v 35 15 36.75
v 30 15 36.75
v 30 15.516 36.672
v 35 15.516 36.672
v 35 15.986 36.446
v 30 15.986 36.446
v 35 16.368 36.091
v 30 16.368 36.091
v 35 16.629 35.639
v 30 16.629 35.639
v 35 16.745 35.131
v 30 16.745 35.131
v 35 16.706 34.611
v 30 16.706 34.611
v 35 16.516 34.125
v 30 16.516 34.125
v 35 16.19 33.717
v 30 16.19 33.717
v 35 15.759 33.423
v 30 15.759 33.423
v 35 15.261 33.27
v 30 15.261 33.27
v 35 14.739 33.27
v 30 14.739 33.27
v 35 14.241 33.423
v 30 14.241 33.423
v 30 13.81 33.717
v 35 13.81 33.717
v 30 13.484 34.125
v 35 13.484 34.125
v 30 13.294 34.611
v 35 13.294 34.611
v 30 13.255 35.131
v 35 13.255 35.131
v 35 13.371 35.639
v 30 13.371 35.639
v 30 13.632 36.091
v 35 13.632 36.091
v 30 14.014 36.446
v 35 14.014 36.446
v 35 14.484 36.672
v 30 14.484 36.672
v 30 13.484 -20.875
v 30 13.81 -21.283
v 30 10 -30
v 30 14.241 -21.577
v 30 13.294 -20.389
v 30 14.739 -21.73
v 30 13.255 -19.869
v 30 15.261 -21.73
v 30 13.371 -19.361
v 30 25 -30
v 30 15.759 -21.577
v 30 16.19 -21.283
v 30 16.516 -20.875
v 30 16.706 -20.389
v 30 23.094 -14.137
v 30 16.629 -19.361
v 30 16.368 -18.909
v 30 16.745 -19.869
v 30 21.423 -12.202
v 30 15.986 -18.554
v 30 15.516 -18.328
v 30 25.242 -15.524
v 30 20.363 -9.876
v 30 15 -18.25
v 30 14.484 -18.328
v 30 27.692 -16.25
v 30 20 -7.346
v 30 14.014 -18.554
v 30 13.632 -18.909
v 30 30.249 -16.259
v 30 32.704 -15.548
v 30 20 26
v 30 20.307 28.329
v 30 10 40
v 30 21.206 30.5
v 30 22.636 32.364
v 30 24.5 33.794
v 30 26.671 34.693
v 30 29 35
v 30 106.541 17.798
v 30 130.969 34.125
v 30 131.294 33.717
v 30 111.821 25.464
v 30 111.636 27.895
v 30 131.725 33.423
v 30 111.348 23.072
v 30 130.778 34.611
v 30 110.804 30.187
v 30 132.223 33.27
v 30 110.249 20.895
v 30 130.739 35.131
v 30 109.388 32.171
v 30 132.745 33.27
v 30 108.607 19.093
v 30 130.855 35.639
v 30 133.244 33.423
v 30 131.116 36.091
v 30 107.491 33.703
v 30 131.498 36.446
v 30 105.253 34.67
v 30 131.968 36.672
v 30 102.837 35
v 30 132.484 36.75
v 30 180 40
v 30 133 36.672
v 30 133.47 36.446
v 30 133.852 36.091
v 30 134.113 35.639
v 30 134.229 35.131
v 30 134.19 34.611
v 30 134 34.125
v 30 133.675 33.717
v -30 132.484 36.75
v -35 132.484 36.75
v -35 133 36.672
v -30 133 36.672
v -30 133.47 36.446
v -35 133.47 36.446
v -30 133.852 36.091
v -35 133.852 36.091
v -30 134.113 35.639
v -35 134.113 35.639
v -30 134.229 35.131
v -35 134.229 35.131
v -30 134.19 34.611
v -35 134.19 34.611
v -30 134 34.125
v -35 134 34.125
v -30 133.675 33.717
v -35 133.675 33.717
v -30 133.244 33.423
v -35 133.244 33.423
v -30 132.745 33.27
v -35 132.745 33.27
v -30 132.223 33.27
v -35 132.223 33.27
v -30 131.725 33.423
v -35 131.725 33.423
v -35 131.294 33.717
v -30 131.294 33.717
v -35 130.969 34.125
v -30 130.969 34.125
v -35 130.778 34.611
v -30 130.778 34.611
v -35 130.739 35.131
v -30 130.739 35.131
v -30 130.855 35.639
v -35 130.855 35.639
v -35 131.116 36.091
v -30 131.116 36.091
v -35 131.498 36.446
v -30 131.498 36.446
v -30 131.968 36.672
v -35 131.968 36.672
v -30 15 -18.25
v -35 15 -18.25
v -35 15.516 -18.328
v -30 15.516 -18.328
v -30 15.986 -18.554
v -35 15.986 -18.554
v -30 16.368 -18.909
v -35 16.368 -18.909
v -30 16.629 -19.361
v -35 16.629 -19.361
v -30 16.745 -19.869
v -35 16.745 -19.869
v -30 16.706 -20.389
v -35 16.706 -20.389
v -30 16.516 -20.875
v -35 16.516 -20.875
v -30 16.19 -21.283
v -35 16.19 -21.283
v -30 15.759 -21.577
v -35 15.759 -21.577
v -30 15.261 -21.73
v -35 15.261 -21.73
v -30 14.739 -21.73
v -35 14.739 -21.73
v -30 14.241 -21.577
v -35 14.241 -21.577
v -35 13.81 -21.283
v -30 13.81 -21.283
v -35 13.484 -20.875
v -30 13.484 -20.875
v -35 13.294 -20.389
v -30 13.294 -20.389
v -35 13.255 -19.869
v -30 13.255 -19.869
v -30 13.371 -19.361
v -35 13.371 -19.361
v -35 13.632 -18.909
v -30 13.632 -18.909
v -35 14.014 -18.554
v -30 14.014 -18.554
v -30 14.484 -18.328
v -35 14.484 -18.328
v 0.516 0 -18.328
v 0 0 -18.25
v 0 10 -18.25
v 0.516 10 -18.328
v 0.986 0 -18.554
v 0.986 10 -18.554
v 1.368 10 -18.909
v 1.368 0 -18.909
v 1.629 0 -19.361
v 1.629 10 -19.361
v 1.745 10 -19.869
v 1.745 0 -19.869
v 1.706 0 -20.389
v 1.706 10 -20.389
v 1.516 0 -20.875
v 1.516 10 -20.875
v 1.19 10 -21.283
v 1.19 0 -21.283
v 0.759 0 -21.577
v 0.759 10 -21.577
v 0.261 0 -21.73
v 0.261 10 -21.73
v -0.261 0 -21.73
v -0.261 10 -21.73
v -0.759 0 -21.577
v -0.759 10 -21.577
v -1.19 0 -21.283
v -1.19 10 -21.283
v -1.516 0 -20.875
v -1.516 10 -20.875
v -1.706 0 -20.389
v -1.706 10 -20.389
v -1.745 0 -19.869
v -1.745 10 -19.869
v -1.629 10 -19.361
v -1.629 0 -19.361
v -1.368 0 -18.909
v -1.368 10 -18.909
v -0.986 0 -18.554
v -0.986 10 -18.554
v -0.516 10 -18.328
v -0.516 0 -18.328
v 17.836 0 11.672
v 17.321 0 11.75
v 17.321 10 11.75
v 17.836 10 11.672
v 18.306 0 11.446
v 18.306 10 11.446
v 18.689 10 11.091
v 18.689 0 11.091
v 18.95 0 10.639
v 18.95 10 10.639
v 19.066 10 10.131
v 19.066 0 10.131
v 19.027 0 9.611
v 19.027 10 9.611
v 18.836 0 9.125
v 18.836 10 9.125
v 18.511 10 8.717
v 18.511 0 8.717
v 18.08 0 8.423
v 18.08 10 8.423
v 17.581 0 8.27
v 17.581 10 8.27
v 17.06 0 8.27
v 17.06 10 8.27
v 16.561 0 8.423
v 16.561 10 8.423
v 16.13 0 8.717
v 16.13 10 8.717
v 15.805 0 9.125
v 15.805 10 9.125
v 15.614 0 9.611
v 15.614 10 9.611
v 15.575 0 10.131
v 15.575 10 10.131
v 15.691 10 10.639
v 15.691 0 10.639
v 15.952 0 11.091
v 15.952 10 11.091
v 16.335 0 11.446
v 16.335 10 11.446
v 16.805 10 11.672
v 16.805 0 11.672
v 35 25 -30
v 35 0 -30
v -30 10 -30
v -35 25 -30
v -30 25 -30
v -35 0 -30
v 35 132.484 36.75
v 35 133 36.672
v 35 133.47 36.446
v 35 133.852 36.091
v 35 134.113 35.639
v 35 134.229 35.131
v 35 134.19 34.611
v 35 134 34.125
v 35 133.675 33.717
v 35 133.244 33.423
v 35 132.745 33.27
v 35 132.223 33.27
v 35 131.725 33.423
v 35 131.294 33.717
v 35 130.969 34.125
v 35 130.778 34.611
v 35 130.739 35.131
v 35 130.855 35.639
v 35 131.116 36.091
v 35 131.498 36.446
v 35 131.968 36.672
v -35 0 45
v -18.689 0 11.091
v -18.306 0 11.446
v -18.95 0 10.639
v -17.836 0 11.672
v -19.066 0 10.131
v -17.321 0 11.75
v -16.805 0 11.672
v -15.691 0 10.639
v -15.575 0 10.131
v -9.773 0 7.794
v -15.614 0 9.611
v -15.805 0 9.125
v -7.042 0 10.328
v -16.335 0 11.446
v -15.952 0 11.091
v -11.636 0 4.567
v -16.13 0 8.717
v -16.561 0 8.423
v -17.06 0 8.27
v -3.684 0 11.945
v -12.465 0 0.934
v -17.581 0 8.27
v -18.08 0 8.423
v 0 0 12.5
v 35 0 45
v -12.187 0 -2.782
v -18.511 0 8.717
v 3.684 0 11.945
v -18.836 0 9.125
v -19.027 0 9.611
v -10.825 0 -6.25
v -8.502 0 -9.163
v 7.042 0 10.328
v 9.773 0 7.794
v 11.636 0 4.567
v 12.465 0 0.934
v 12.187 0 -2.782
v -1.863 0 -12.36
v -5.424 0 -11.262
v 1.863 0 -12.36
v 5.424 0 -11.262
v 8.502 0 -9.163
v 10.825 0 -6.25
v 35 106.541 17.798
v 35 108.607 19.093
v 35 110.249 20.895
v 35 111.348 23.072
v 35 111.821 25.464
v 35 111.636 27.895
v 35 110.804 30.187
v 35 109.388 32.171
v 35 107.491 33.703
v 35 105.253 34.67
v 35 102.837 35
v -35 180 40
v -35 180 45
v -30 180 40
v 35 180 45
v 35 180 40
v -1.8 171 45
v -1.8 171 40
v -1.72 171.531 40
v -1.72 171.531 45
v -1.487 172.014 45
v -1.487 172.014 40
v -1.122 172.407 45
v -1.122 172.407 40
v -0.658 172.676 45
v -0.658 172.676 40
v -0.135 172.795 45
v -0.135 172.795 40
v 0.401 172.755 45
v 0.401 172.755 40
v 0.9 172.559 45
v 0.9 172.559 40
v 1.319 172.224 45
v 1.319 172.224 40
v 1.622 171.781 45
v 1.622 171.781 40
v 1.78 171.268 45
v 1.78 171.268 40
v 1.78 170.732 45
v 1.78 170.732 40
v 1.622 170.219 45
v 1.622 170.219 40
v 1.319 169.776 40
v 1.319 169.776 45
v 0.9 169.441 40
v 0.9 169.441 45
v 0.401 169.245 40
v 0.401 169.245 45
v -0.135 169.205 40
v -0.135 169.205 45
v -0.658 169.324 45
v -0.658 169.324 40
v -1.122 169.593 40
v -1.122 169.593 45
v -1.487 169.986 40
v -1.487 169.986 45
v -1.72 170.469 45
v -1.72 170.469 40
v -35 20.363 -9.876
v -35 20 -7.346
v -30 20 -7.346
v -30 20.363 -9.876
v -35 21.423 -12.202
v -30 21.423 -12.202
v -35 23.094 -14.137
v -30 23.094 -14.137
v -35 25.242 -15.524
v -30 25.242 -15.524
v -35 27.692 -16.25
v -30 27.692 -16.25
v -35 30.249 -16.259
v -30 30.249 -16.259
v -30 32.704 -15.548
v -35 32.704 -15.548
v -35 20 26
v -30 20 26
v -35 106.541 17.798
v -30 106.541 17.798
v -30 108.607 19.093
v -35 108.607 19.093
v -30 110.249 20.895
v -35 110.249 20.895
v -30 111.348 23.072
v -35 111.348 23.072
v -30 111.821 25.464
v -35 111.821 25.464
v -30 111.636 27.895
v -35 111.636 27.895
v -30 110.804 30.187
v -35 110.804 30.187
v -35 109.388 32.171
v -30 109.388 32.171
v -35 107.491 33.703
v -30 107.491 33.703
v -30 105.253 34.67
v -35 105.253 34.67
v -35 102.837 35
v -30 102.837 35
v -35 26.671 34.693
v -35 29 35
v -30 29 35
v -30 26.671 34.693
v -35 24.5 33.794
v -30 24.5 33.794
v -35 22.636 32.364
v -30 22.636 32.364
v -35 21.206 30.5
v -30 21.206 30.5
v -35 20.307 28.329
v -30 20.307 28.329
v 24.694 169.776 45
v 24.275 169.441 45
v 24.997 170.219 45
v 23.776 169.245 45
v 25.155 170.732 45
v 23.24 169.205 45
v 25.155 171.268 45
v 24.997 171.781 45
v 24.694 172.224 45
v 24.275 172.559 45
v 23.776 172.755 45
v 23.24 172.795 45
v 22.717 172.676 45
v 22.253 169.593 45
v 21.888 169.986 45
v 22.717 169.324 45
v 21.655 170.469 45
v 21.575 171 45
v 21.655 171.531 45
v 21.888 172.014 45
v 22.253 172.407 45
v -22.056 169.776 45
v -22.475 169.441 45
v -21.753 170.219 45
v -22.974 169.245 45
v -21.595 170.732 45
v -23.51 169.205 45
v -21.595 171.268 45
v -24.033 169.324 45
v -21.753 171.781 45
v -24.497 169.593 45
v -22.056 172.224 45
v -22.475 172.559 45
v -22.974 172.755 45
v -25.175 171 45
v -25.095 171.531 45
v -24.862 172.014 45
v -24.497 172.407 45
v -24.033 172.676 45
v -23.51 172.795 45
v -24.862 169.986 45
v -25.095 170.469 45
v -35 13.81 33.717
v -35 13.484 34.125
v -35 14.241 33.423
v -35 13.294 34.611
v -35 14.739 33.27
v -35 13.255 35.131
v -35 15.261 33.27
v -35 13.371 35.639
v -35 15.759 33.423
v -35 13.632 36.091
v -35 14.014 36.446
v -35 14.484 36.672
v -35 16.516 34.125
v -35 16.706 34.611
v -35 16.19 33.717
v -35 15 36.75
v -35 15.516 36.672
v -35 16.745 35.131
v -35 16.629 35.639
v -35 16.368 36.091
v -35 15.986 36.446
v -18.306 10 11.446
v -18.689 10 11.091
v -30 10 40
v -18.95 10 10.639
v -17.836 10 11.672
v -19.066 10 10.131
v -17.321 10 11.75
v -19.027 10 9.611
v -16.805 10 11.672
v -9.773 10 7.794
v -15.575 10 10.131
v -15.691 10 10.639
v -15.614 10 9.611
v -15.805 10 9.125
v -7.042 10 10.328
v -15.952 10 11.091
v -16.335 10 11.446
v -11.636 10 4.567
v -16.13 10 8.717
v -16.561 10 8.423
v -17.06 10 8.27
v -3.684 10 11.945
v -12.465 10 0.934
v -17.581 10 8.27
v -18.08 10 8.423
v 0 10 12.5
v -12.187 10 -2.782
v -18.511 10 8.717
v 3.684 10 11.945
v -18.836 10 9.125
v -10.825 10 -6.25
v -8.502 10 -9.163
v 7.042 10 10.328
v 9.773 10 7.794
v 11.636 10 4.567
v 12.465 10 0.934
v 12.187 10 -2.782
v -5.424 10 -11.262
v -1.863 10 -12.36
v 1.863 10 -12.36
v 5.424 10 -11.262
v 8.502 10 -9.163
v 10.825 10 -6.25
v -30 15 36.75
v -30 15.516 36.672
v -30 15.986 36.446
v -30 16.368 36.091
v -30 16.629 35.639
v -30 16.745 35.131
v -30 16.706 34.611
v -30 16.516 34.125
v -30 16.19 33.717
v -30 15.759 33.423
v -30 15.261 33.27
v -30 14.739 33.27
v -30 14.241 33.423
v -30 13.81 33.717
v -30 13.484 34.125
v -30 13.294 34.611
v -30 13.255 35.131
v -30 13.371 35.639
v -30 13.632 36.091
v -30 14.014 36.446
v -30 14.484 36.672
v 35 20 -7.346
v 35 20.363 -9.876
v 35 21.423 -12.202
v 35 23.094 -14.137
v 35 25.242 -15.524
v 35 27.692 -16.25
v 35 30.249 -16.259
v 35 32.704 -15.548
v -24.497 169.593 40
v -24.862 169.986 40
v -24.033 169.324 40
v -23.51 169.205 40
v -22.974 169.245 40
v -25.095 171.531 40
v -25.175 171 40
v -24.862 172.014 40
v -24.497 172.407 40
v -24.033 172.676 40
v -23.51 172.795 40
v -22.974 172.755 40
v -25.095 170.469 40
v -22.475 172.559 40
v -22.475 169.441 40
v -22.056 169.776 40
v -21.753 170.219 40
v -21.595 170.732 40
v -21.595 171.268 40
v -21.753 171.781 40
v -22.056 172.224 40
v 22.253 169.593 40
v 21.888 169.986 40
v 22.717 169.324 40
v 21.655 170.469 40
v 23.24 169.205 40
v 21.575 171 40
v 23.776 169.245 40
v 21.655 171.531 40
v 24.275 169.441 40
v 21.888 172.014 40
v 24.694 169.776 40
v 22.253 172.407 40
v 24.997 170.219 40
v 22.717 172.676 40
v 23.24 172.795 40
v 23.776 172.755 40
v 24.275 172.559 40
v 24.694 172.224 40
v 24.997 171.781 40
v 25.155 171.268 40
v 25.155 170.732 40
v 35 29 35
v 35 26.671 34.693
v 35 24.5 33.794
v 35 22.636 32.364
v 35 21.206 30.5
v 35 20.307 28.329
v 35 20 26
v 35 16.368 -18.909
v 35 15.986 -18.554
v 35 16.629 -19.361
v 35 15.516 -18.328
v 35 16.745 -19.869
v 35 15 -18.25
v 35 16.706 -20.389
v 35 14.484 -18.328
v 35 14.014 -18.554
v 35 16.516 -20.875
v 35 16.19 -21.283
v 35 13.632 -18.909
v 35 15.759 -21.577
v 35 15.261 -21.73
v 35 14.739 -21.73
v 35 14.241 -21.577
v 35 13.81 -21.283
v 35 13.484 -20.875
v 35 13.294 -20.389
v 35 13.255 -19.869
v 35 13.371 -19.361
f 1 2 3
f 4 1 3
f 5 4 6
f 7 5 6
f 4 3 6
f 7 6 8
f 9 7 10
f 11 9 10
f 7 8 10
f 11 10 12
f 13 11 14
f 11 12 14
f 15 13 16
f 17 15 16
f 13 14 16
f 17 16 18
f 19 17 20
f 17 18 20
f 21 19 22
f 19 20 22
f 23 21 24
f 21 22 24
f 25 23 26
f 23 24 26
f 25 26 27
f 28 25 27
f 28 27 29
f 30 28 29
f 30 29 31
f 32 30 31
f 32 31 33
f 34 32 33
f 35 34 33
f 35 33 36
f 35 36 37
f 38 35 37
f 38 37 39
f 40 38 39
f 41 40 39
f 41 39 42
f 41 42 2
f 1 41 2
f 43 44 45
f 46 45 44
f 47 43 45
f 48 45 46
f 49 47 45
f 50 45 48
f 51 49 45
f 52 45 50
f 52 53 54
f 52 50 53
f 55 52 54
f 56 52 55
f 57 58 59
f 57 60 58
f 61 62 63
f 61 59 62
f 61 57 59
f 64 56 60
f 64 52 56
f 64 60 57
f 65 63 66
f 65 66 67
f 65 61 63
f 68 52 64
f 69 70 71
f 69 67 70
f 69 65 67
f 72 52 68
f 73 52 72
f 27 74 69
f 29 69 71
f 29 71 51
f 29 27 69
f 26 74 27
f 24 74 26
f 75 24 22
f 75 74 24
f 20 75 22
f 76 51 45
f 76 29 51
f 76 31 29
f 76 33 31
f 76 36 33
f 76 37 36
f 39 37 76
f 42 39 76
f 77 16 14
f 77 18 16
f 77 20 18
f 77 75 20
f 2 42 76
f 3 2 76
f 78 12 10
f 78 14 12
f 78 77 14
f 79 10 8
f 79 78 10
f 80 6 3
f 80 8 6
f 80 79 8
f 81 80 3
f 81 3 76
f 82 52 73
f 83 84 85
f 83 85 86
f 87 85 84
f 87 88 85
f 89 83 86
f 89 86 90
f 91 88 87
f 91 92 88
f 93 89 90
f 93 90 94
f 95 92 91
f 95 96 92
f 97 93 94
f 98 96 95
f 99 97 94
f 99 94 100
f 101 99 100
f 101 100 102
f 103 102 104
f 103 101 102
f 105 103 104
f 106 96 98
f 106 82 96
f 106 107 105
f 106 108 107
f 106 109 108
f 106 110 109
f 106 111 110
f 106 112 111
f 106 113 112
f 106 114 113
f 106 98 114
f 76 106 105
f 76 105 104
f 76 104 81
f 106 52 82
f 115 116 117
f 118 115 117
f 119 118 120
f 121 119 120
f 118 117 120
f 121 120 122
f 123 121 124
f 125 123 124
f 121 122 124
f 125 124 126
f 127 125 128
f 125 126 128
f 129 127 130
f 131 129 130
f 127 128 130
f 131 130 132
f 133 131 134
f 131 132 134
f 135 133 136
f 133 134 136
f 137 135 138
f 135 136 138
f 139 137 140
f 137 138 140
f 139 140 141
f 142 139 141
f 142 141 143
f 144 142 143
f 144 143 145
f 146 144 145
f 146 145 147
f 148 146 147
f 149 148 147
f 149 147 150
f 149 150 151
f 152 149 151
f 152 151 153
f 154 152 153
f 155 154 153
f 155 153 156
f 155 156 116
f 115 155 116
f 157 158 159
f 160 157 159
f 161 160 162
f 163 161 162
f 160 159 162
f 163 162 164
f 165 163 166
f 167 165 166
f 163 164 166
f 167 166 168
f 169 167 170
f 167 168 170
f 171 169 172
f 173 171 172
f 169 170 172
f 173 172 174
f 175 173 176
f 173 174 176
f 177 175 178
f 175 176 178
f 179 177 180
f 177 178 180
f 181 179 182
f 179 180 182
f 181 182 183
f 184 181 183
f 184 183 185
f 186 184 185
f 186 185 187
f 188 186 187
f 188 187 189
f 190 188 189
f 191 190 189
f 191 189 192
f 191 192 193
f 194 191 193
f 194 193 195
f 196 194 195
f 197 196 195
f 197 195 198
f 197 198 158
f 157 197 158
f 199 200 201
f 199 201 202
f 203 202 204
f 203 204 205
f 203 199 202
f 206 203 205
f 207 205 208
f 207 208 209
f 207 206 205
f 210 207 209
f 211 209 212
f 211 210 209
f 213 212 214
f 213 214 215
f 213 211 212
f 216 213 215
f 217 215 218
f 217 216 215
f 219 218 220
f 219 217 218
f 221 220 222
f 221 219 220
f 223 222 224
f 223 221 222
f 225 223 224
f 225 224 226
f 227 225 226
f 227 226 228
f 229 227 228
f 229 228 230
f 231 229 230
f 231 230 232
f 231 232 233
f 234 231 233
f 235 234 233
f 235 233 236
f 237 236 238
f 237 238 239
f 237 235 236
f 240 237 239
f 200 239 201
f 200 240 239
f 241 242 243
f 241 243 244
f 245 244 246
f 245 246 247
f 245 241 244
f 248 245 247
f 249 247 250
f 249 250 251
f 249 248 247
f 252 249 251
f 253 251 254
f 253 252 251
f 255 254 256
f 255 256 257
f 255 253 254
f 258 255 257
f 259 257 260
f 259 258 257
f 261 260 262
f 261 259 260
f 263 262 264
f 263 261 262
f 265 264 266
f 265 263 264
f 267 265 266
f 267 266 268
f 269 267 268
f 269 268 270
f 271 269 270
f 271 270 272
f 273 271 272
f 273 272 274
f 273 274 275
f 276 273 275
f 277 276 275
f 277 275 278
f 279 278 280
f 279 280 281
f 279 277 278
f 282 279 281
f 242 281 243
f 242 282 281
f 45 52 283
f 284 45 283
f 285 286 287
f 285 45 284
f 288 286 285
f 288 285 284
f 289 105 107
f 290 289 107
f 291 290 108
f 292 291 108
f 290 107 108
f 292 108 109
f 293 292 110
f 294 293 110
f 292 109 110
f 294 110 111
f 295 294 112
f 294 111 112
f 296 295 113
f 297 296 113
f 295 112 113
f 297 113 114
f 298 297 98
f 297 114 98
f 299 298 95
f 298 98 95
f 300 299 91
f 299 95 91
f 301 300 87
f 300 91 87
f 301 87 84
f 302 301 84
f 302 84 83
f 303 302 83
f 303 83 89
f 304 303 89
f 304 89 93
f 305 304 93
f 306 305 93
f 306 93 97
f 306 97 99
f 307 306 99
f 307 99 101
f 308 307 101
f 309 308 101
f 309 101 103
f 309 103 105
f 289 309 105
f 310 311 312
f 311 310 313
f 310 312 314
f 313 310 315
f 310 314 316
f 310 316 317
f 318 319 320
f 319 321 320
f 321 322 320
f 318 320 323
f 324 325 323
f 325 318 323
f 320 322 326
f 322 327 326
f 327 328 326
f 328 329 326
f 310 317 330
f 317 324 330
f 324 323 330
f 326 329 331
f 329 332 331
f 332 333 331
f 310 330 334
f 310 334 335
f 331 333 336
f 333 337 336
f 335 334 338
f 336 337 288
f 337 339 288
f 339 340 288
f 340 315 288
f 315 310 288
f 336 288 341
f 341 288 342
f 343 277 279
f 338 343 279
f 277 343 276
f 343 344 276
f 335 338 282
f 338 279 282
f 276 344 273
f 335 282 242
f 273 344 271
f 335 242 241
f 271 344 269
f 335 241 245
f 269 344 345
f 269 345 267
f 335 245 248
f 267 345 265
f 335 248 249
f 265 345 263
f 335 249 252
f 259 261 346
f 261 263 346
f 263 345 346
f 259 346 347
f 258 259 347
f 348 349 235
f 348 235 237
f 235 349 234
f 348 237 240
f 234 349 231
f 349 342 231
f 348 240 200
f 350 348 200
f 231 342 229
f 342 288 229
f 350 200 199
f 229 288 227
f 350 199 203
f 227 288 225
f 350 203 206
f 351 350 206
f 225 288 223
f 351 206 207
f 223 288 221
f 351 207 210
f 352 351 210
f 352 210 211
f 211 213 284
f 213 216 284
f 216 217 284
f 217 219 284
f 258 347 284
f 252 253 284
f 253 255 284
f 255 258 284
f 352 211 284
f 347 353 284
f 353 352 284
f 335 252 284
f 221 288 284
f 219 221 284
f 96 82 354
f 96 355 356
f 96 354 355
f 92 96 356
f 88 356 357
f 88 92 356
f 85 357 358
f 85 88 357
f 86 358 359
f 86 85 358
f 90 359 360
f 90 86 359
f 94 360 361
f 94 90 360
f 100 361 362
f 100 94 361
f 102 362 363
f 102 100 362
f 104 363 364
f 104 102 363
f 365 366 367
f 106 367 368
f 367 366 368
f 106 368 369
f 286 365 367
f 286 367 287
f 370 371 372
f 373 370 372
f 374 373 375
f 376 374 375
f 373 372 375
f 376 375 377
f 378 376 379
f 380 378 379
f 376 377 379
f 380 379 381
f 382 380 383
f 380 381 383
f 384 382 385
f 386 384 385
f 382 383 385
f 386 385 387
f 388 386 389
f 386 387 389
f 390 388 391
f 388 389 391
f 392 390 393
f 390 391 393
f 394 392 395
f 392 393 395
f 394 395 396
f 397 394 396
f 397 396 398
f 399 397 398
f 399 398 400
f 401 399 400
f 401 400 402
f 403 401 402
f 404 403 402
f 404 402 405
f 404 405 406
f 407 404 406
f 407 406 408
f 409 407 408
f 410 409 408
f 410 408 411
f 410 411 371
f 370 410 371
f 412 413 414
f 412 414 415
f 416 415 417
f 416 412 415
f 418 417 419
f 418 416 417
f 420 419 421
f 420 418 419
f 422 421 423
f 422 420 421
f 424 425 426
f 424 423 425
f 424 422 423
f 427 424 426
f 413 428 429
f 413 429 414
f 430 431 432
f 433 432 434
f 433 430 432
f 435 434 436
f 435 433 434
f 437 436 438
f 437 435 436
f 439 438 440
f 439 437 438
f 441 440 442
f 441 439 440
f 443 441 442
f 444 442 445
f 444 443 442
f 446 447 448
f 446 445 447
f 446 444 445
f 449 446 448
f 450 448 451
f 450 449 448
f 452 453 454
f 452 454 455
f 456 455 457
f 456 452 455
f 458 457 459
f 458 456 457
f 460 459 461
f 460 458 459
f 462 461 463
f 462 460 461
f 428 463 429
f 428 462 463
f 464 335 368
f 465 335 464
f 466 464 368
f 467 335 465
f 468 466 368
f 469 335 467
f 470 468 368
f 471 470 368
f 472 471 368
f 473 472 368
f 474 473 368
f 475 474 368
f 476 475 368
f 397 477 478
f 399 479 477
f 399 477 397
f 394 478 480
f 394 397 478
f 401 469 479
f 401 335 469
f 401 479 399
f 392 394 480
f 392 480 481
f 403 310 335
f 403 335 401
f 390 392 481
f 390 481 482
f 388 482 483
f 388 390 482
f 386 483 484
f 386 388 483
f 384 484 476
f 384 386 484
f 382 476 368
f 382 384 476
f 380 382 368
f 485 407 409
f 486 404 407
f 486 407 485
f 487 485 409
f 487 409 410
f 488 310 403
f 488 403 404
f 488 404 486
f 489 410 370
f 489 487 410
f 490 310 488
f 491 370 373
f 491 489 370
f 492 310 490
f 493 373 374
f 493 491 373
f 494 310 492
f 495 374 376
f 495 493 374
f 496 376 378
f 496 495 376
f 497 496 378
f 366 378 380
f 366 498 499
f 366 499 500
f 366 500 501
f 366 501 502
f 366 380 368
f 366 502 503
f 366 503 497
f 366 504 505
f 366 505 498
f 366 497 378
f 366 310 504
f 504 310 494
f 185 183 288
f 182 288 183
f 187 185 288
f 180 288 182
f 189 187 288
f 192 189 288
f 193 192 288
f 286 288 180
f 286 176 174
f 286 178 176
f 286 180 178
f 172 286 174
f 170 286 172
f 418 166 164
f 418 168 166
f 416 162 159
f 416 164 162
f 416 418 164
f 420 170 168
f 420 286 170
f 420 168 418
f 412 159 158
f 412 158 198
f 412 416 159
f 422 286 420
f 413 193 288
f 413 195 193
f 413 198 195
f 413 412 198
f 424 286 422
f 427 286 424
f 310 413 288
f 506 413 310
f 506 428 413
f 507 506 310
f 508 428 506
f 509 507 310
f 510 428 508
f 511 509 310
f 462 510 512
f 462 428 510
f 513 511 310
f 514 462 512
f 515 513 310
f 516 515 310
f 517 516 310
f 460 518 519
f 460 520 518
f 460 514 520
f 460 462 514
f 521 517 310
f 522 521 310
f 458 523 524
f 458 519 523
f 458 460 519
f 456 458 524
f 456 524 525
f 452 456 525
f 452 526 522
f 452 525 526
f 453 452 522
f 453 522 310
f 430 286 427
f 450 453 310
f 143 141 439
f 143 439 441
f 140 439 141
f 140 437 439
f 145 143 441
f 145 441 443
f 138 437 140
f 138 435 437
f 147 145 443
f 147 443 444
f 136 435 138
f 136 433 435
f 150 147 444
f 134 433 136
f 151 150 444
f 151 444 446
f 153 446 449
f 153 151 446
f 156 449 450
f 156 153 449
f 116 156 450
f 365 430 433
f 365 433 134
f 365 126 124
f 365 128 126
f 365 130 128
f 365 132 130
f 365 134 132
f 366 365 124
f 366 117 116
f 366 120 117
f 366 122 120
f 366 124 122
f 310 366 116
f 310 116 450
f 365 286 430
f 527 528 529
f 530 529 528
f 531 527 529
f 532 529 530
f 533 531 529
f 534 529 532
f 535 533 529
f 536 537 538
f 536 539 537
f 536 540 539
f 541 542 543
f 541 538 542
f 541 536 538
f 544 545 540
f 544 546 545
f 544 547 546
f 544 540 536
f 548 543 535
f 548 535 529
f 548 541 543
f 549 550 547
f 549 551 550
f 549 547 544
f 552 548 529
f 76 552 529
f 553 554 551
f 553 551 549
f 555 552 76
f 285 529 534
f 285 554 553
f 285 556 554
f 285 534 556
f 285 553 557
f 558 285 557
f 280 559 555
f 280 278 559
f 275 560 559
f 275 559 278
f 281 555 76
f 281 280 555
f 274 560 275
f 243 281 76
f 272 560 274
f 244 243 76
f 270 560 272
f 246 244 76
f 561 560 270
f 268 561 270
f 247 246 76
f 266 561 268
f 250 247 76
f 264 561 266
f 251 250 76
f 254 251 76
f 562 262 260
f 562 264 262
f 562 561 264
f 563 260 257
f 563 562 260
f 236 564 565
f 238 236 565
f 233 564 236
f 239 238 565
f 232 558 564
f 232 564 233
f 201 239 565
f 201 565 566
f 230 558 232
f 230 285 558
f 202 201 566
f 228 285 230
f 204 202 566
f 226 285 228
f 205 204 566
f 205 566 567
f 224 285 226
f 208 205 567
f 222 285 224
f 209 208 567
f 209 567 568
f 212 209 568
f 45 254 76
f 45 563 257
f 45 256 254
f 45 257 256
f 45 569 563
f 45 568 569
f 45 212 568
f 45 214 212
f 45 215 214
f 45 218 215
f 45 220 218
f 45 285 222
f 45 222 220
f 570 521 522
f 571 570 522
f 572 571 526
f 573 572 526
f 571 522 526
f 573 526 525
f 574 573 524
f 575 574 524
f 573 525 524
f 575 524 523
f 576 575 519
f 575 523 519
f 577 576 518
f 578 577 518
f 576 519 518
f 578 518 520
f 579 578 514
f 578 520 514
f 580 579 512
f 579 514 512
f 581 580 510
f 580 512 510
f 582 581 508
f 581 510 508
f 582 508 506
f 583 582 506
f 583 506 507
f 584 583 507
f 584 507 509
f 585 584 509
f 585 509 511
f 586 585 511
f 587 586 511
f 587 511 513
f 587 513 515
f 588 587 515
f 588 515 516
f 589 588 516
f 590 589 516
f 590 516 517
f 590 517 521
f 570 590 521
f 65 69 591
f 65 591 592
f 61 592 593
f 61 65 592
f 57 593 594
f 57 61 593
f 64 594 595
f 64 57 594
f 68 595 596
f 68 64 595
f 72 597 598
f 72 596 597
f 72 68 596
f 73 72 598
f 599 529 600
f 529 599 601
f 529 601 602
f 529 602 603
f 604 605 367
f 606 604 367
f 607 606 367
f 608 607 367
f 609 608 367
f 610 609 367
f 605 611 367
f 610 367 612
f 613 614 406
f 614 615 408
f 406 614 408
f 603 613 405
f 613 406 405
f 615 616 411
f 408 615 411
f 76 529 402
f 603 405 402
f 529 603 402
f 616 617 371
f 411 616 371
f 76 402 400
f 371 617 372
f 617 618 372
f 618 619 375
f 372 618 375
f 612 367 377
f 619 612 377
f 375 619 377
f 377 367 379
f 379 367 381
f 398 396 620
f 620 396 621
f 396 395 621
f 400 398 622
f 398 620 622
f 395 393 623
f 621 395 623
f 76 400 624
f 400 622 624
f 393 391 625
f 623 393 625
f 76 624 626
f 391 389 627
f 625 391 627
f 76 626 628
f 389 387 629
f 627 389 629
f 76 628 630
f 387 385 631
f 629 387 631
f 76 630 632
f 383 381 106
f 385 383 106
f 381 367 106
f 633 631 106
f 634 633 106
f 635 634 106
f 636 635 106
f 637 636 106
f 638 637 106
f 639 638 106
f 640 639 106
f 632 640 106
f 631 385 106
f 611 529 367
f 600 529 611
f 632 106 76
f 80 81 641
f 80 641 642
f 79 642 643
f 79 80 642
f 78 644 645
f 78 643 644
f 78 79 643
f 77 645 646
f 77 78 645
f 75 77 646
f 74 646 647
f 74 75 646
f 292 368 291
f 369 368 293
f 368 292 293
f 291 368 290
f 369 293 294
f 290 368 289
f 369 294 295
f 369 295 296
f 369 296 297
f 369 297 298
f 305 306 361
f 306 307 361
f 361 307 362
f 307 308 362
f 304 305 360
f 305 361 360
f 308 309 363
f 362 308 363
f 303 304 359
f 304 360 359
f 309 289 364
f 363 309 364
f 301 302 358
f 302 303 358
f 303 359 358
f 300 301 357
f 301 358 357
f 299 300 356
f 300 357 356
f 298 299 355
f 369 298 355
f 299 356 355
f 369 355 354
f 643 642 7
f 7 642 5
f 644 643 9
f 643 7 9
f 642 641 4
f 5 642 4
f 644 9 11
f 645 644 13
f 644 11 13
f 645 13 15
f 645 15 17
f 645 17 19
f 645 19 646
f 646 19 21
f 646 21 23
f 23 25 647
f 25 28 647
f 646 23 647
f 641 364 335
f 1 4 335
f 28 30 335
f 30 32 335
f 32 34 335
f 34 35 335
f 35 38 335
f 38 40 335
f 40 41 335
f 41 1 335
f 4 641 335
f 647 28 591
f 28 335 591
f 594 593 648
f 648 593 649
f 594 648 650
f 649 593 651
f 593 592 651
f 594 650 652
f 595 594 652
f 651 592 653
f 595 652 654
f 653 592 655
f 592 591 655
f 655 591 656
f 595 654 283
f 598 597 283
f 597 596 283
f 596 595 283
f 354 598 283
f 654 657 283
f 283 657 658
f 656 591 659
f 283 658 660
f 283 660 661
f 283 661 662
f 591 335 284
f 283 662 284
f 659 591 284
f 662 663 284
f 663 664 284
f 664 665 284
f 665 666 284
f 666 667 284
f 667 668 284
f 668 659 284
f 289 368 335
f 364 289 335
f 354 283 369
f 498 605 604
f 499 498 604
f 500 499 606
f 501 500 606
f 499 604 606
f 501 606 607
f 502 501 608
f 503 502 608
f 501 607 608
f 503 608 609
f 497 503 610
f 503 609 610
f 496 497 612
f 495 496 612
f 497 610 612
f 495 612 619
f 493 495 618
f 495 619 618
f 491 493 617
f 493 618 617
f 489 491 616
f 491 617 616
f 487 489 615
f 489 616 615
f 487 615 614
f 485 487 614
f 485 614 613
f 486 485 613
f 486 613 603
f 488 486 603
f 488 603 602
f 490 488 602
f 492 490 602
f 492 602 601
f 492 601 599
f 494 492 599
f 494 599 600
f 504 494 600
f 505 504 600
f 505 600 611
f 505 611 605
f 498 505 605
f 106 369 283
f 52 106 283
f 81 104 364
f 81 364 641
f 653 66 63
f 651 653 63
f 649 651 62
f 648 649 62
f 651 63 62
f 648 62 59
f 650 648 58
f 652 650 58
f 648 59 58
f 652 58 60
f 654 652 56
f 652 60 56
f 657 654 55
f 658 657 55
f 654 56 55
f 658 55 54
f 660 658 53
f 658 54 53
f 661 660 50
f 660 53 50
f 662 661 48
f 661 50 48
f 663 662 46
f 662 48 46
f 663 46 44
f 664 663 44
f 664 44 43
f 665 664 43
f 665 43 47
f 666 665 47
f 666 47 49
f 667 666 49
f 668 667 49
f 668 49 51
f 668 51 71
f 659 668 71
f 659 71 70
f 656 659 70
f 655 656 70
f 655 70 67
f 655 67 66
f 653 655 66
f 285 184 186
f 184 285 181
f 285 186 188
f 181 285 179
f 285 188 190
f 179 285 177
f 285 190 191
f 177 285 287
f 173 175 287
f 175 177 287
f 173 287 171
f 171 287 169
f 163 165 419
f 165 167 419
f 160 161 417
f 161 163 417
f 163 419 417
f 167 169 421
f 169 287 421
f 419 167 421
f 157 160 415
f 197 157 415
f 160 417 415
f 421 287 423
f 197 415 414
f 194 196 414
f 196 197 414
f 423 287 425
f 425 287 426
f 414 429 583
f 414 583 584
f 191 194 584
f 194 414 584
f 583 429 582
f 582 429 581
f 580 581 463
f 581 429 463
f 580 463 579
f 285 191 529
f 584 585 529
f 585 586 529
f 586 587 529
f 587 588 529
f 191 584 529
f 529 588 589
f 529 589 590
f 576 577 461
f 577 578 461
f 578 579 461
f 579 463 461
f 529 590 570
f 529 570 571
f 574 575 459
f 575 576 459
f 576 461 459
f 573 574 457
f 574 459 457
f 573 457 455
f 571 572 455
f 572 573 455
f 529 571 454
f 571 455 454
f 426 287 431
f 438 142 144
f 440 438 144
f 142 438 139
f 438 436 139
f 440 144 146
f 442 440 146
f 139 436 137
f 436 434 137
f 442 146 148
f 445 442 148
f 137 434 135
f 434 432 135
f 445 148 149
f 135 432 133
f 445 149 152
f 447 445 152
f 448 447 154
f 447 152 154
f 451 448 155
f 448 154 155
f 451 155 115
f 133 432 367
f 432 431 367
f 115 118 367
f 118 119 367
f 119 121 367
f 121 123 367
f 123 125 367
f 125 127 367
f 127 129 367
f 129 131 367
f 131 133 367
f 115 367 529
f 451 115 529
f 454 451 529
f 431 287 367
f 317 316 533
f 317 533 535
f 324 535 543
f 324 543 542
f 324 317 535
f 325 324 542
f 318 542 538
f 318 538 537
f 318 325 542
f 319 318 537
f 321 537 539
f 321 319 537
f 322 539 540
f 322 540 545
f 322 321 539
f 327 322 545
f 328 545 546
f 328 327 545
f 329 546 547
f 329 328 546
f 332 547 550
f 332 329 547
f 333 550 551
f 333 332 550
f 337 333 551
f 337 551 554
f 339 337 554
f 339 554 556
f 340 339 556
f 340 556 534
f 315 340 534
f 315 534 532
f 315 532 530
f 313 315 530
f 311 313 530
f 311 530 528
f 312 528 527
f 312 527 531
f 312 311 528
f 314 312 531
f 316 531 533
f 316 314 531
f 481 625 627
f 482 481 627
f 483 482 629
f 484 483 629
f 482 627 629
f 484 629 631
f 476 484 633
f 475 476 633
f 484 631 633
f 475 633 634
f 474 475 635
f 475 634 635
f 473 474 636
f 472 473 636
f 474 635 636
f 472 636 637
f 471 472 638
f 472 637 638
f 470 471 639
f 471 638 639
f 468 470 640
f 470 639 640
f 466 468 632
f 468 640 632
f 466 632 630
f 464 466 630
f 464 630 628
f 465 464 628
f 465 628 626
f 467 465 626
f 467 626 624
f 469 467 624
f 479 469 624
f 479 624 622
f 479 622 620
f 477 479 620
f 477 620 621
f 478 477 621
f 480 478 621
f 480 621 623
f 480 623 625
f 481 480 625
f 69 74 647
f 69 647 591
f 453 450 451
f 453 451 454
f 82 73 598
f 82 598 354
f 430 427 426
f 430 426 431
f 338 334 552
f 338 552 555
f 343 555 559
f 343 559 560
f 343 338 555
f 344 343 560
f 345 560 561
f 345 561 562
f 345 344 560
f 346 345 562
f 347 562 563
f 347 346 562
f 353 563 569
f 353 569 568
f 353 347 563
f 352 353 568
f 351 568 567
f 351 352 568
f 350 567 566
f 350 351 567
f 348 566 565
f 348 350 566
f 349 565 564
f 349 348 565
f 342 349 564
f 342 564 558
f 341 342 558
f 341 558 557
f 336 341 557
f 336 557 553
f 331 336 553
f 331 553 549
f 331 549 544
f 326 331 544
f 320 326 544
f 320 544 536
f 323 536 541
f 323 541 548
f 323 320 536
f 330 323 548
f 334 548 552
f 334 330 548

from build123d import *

# Parameters (mm, degrees)
SKETCH_1_W          = 70
SKETCH_1_H          = 75
SKETCH_1_R          = 12.5
SKETCH_1_R_2        = 1.75
EXTRUDE_1_DEPTH     = 10
EXTRUDE_3_DEPTH     = 5
EXTRUDE_4_DEPTH     = 5
SKETCH_7_W          = 70
SKETCH_7_H          = 180
EXTRUDE_5_DEPTH     = 5
SKETCH_10_R         = 1.8
CUT_EXTRUDE_2_DEPTH = 197.277864264
SKETCH_11_R         = 1.75
CUT_EXTRUDE_3_DEPTH = 199.305320151


with BuildPart() as part:
    # 草图1 → 凸台-拉伸1 (new body)
    with BuildSketch(Plane(origin=(0, 0, 0), x_dir=(1, 0, 0), z_dir=(0, 1, 0))):
        with Locations((0, -7.5)):
            Rectangle(SKETCH_1_W, SKETCH_1_H)
        with Locations(Location((0, 0, 0), (0, 0, 270))):
            Circle(SKETCH_1_R, mode=Mode.SUBTRACT)
        with Locations(Location((0, 20, 0), (0, 0, 270))):
            Circle(SKETCH_1_R_2, mode=Mode.SUBTRACT)
        with Locations(Location((17.320508076, -10, 0), (0, 0, 270))):
            Circle(SKETCH_1_R_2, mode=Mode.SUBTRACT)
        with Locations(Location((-17.320508076, -10, 0), (0, 0, 270))):
            Circle(SKETCH_1_R_2, mode=Mode.SUBTRACT)
    extrude(amount=EXTRUDE_1_DEPTH)

    # 草图6 → 凸台-拉伸3 (add)
    with BuildSketch(Plane.ZY.offset(35)):
        Polygon((40, 180), (-30, 25), (-30, 0), (45, 0), (45, 180), align=None)
    extrude(amount=-EXTRUDE_3_DEPTH)

    # 草图8 → 凸台-拉伸4 (add)
    with BuildSketch(Plane(origin=(35, 0, 0), x_dir=(0, 0, -1), z_dir=(1, 0, 0))):
        Polygon((-45, 0), (-45, 180), (-40, 180), (30, 25), (30, 0), align=None)
    extrude(amount=-EXTRUDE_4_DEPTH)

    # 草图7 → 凸台-拉伸5 (add)
    with BuildSketch(Plane.XY.offset(45)):
        with Locations((0, 90)):
            Rectangle(SKETCH_7_W, SKETCH_7_H)
    extrude(amount=-EXTRUDE_5_DEPTH)

    # 草图10 → 切除-拉伸2 (cut, through all)
    with BuildSketch(Plane(origin=(0, 0, 40), x_dir=(-1, 0, 0), z_dir=(0, 0, -1))):
        with Locations((-23.375, 171)):
            Circle(SKETCH_10_R)
        with Locations((23.375, 171)):
            Circle(SKETCH_10_R)
        with Locations((0, 171)):
            Circle(SKETCH_10_R)
    extrude(amount=-CUT_EXTRUDE_2_DEPTH, mode=Mode.SUBTRACT)

    # 草图11 → 切除-拉伸3 (cut, through all)
    with BuildSketch(Plane.ZY.offset(35)):
        with Locations((35, 132.484247104)):
            Circle(SKETCH_11_R)
        with Locations((35, 15)):
            Circle(SKETCH_11_R)
        with Locations((-20, 15)):
            Circle(SKETCH_11_R)
        with BuildLine():
            Line((35, 102.837189188), (35, 29))
            ThreePointArc((35, 29), (32.363961031, 22.636038969), (26, 20))
            Line((26, 20), (-7.345827375, 20))
            ThreePointArc((-7.345827375, 20), (-14.906863168, 24.118326338), (-15.548162772, 32.704280502))
            Line((-15.548162772, 32.704280502), (17.797664603, 106.54146969))
            ThreePointArc((17.797664603, 106.54146969), (27.894595132, 111.63551342), (35, 102.837189188))
        make_face()
    extrude(amount=-CUT_EXTRUDE_3_DEPTH, mode=Mode.SUBTRACT)


solid = part.part
